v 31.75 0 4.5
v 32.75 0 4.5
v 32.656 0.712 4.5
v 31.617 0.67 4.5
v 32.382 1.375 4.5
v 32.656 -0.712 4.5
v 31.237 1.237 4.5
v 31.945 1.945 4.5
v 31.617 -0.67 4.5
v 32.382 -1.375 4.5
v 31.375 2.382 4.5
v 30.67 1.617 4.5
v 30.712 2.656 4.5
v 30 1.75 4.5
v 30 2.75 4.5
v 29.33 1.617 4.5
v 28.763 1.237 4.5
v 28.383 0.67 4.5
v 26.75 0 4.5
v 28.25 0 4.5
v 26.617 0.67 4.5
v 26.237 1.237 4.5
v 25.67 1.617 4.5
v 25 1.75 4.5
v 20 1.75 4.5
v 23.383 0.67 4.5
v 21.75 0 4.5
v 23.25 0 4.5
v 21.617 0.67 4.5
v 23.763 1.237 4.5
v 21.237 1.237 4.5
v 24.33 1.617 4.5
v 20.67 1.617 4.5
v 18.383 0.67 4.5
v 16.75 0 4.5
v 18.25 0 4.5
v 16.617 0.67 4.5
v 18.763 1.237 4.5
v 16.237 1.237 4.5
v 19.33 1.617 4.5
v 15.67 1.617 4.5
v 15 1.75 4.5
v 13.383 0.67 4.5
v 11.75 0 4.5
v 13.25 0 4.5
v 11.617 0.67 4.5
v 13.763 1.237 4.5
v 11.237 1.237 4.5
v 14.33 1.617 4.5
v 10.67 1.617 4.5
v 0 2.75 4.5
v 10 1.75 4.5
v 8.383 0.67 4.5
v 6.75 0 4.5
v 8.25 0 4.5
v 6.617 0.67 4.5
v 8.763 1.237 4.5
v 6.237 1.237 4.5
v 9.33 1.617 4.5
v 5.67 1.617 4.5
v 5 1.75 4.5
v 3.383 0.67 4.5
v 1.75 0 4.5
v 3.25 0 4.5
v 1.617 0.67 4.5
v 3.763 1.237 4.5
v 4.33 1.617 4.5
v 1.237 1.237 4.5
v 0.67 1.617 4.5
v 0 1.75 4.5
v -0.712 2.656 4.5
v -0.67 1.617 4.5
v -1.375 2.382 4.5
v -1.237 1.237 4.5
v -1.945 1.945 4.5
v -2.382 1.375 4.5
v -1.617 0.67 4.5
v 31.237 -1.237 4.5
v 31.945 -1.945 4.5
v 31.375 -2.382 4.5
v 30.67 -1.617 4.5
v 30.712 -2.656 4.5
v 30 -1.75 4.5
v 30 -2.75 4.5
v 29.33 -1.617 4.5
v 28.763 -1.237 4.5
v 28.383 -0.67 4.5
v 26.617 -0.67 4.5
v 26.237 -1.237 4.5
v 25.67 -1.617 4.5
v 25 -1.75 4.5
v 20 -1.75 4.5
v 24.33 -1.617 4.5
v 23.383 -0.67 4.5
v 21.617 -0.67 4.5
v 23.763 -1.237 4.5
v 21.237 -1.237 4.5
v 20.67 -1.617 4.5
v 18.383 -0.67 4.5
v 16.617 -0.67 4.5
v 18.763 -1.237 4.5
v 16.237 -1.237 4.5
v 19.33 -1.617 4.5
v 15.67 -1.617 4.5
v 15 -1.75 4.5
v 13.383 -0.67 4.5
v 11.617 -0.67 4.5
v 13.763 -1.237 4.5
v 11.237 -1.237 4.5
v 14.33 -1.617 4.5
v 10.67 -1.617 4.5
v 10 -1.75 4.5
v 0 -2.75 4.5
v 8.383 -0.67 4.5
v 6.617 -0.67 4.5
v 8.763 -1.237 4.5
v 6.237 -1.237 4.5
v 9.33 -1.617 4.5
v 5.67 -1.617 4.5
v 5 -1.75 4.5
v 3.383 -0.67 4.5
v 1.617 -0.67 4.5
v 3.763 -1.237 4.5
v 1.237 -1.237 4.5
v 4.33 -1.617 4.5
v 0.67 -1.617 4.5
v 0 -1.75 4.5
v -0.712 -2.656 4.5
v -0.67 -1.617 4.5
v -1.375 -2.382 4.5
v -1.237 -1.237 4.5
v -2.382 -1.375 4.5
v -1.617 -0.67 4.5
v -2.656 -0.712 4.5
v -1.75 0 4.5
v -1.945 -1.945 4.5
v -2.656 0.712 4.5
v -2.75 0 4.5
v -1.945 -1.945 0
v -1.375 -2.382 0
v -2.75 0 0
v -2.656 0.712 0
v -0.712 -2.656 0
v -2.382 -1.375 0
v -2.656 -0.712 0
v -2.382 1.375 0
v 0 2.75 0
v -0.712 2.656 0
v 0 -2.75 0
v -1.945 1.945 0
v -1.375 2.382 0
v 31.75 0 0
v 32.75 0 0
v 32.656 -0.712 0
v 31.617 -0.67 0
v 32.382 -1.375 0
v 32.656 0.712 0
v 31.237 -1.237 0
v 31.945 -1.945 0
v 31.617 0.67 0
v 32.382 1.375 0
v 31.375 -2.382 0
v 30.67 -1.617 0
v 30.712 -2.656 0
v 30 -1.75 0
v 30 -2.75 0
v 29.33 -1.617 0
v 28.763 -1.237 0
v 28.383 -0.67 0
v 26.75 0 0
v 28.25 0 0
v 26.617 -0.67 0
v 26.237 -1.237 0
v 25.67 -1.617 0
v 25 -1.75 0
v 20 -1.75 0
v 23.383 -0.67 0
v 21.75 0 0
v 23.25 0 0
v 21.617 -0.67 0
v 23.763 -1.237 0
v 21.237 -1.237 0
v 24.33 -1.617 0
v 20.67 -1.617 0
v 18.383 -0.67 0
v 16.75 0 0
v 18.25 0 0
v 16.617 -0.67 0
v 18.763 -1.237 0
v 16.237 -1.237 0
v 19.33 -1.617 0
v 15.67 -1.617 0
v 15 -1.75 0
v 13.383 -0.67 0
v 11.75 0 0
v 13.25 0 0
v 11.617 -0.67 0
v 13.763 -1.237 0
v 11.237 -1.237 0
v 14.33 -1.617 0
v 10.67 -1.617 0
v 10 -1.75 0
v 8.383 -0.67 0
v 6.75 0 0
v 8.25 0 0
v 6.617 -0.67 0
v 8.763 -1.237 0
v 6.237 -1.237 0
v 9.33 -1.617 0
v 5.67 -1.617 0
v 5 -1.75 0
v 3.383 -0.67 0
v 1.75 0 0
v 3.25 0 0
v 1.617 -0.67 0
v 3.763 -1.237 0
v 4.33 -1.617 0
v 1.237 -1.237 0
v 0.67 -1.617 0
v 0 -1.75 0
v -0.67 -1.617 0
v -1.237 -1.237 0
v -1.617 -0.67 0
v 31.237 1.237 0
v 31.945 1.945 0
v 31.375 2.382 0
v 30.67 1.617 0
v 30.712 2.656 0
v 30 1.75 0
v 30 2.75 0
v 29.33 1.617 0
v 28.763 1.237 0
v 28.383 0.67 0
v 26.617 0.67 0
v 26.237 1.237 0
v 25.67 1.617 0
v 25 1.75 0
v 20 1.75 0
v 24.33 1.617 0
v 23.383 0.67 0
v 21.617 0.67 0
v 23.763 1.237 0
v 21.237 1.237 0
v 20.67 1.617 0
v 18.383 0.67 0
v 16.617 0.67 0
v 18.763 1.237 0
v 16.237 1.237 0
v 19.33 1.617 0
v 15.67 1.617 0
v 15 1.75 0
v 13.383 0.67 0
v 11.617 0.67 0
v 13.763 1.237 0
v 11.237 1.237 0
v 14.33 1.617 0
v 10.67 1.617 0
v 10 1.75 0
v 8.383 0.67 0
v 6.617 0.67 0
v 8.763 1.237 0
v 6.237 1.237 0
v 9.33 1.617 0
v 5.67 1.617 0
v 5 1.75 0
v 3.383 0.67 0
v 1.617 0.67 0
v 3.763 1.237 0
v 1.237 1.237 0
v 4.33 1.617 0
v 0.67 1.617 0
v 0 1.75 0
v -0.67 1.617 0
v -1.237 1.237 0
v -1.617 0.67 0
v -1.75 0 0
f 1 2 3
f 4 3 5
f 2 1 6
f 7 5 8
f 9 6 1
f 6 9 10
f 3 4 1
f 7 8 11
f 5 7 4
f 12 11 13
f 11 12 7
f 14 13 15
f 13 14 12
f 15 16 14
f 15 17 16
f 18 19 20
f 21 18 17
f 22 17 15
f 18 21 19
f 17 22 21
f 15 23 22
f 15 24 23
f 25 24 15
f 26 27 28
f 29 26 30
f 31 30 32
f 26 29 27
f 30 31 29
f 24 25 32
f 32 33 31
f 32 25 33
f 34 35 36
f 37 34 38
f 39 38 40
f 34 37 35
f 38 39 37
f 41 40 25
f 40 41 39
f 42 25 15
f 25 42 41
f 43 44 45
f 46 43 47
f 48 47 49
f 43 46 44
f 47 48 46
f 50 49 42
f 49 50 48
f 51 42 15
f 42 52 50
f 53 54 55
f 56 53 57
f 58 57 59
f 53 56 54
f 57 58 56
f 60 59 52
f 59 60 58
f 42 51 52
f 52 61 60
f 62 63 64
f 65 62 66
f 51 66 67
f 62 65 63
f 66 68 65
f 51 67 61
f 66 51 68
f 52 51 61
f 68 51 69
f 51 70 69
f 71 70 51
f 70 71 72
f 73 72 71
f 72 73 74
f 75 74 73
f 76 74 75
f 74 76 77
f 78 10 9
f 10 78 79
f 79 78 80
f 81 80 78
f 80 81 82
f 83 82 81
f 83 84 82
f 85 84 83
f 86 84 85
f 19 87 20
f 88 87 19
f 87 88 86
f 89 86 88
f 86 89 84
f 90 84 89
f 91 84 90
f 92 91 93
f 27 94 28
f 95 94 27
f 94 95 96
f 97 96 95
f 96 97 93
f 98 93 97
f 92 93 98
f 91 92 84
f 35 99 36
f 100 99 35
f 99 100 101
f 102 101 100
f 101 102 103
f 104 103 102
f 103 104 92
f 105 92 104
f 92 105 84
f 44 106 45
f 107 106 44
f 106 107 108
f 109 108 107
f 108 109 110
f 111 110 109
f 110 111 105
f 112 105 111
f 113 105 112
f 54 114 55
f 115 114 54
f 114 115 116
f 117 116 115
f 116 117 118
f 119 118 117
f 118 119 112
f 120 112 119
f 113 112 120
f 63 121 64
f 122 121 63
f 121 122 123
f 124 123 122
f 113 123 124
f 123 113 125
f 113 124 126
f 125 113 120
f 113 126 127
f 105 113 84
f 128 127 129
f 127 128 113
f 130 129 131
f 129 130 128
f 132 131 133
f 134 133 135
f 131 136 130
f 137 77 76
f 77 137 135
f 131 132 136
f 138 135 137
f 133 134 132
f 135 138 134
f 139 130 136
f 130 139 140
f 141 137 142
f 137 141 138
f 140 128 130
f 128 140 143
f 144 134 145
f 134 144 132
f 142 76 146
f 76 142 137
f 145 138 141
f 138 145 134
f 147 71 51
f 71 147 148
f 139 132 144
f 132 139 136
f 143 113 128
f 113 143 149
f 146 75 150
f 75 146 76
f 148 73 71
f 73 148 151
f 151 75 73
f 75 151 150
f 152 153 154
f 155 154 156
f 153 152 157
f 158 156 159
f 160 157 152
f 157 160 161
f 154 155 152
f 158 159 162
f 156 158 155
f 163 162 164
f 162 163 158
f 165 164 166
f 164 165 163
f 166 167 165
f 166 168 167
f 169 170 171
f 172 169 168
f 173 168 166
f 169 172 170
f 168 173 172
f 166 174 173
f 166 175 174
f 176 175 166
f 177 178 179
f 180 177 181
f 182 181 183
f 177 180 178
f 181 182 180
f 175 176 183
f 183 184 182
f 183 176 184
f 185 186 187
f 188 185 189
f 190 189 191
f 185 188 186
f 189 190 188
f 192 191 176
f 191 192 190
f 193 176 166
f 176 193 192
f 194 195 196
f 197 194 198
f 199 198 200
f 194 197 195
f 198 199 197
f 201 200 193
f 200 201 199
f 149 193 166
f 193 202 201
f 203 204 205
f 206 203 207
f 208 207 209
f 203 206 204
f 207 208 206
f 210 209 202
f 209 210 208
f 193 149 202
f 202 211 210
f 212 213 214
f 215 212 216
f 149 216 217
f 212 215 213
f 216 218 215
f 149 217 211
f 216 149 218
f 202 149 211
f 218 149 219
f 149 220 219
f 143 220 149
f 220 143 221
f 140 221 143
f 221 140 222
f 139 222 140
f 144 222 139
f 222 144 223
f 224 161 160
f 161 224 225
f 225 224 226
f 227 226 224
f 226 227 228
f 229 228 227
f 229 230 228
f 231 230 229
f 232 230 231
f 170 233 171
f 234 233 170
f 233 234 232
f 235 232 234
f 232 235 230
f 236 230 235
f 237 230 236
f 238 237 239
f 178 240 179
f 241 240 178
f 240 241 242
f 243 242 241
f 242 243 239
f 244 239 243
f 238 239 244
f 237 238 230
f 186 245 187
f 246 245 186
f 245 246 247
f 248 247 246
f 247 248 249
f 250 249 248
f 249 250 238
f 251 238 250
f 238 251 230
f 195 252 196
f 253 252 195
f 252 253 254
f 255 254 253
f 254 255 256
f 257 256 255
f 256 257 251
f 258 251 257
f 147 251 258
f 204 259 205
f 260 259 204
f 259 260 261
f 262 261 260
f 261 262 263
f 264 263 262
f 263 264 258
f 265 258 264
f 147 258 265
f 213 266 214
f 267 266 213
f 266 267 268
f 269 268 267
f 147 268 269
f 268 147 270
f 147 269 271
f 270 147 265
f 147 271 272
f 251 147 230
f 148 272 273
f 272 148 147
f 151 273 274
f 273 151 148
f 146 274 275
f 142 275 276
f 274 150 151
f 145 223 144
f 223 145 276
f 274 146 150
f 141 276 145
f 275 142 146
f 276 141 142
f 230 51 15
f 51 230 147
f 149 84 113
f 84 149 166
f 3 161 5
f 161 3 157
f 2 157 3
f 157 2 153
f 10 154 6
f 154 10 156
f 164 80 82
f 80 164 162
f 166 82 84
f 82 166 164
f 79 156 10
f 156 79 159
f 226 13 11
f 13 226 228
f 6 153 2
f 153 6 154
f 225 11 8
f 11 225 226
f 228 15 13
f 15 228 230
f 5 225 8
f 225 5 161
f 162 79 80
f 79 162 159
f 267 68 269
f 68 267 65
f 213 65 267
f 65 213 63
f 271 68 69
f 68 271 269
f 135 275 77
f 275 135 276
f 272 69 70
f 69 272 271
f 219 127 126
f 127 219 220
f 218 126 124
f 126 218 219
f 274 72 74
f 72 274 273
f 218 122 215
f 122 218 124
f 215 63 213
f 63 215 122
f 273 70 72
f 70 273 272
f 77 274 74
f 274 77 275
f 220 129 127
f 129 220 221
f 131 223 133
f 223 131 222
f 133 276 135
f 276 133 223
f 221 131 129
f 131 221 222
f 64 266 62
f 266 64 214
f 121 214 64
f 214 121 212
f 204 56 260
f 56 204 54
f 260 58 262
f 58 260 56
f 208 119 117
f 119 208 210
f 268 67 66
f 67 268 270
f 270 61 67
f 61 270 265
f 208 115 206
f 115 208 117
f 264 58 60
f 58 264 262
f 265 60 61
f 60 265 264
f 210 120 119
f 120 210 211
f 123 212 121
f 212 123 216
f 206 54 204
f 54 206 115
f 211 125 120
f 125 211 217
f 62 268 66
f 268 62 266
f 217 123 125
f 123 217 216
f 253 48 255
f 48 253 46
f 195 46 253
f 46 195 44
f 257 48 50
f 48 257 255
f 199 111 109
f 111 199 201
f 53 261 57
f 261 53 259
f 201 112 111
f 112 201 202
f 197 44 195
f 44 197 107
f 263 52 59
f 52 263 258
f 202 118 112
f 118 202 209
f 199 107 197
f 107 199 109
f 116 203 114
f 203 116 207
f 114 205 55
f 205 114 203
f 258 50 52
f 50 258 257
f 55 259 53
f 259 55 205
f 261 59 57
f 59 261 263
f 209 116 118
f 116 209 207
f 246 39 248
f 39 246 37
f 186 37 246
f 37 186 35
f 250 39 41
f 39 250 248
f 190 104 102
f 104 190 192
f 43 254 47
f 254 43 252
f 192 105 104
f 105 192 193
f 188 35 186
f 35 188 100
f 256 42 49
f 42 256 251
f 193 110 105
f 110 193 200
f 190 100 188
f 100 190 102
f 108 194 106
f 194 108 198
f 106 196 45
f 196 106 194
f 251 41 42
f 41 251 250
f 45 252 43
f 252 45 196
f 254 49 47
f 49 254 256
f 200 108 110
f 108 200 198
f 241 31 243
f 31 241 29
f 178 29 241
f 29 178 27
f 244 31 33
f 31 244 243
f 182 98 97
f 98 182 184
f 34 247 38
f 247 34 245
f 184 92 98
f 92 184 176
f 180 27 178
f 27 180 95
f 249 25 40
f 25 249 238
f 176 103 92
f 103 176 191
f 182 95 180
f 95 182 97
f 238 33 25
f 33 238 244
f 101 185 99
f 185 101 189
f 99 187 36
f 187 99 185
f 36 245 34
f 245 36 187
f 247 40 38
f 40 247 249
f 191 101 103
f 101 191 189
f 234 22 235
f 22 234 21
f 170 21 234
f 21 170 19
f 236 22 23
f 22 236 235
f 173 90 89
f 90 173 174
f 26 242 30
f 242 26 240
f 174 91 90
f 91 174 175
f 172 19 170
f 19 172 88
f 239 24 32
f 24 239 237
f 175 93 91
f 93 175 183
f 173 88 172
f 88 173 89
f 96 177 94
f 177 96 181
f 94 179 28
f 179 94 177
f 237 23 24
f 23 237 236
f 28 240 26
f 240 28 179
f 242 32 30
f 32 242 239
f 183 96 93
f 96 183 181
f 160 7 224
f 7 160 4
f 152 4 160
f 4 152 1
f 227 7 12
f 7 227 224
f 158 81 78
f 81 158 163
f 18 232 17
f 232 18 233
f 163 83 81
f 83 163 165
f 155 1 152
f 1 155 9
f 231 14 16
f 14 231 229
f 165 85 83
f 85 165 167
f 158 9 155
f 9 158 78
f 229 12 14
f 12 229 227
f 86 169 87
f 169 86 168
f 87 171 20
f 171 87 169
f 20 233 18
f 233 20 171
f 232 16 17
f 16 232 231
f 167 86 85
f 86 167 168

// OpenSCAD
h = 4.5;  //height
d = 3.5;  //hole diameter
wall = 1; //wall thickness
m = 5;    //module (hole distance)

holes = 7;

r = d/2;

difference() {
  union() {
    cylinder(r = r+wall, h = h, $fn = 24);
    translate(v = [0,-r-wall,0])
      cube(size = [(holes-1)*m,d+wall*2,h]);
    translate([(holes-1)*m,0,0])
      cylinder(r = r+wall, h = h, $fn = 24);
  }

  for(i = [0:holes-1])
    translate(v = [i*m,0,-1])
      cylinder(r = r, h = h+2, $fn = 16);
}
